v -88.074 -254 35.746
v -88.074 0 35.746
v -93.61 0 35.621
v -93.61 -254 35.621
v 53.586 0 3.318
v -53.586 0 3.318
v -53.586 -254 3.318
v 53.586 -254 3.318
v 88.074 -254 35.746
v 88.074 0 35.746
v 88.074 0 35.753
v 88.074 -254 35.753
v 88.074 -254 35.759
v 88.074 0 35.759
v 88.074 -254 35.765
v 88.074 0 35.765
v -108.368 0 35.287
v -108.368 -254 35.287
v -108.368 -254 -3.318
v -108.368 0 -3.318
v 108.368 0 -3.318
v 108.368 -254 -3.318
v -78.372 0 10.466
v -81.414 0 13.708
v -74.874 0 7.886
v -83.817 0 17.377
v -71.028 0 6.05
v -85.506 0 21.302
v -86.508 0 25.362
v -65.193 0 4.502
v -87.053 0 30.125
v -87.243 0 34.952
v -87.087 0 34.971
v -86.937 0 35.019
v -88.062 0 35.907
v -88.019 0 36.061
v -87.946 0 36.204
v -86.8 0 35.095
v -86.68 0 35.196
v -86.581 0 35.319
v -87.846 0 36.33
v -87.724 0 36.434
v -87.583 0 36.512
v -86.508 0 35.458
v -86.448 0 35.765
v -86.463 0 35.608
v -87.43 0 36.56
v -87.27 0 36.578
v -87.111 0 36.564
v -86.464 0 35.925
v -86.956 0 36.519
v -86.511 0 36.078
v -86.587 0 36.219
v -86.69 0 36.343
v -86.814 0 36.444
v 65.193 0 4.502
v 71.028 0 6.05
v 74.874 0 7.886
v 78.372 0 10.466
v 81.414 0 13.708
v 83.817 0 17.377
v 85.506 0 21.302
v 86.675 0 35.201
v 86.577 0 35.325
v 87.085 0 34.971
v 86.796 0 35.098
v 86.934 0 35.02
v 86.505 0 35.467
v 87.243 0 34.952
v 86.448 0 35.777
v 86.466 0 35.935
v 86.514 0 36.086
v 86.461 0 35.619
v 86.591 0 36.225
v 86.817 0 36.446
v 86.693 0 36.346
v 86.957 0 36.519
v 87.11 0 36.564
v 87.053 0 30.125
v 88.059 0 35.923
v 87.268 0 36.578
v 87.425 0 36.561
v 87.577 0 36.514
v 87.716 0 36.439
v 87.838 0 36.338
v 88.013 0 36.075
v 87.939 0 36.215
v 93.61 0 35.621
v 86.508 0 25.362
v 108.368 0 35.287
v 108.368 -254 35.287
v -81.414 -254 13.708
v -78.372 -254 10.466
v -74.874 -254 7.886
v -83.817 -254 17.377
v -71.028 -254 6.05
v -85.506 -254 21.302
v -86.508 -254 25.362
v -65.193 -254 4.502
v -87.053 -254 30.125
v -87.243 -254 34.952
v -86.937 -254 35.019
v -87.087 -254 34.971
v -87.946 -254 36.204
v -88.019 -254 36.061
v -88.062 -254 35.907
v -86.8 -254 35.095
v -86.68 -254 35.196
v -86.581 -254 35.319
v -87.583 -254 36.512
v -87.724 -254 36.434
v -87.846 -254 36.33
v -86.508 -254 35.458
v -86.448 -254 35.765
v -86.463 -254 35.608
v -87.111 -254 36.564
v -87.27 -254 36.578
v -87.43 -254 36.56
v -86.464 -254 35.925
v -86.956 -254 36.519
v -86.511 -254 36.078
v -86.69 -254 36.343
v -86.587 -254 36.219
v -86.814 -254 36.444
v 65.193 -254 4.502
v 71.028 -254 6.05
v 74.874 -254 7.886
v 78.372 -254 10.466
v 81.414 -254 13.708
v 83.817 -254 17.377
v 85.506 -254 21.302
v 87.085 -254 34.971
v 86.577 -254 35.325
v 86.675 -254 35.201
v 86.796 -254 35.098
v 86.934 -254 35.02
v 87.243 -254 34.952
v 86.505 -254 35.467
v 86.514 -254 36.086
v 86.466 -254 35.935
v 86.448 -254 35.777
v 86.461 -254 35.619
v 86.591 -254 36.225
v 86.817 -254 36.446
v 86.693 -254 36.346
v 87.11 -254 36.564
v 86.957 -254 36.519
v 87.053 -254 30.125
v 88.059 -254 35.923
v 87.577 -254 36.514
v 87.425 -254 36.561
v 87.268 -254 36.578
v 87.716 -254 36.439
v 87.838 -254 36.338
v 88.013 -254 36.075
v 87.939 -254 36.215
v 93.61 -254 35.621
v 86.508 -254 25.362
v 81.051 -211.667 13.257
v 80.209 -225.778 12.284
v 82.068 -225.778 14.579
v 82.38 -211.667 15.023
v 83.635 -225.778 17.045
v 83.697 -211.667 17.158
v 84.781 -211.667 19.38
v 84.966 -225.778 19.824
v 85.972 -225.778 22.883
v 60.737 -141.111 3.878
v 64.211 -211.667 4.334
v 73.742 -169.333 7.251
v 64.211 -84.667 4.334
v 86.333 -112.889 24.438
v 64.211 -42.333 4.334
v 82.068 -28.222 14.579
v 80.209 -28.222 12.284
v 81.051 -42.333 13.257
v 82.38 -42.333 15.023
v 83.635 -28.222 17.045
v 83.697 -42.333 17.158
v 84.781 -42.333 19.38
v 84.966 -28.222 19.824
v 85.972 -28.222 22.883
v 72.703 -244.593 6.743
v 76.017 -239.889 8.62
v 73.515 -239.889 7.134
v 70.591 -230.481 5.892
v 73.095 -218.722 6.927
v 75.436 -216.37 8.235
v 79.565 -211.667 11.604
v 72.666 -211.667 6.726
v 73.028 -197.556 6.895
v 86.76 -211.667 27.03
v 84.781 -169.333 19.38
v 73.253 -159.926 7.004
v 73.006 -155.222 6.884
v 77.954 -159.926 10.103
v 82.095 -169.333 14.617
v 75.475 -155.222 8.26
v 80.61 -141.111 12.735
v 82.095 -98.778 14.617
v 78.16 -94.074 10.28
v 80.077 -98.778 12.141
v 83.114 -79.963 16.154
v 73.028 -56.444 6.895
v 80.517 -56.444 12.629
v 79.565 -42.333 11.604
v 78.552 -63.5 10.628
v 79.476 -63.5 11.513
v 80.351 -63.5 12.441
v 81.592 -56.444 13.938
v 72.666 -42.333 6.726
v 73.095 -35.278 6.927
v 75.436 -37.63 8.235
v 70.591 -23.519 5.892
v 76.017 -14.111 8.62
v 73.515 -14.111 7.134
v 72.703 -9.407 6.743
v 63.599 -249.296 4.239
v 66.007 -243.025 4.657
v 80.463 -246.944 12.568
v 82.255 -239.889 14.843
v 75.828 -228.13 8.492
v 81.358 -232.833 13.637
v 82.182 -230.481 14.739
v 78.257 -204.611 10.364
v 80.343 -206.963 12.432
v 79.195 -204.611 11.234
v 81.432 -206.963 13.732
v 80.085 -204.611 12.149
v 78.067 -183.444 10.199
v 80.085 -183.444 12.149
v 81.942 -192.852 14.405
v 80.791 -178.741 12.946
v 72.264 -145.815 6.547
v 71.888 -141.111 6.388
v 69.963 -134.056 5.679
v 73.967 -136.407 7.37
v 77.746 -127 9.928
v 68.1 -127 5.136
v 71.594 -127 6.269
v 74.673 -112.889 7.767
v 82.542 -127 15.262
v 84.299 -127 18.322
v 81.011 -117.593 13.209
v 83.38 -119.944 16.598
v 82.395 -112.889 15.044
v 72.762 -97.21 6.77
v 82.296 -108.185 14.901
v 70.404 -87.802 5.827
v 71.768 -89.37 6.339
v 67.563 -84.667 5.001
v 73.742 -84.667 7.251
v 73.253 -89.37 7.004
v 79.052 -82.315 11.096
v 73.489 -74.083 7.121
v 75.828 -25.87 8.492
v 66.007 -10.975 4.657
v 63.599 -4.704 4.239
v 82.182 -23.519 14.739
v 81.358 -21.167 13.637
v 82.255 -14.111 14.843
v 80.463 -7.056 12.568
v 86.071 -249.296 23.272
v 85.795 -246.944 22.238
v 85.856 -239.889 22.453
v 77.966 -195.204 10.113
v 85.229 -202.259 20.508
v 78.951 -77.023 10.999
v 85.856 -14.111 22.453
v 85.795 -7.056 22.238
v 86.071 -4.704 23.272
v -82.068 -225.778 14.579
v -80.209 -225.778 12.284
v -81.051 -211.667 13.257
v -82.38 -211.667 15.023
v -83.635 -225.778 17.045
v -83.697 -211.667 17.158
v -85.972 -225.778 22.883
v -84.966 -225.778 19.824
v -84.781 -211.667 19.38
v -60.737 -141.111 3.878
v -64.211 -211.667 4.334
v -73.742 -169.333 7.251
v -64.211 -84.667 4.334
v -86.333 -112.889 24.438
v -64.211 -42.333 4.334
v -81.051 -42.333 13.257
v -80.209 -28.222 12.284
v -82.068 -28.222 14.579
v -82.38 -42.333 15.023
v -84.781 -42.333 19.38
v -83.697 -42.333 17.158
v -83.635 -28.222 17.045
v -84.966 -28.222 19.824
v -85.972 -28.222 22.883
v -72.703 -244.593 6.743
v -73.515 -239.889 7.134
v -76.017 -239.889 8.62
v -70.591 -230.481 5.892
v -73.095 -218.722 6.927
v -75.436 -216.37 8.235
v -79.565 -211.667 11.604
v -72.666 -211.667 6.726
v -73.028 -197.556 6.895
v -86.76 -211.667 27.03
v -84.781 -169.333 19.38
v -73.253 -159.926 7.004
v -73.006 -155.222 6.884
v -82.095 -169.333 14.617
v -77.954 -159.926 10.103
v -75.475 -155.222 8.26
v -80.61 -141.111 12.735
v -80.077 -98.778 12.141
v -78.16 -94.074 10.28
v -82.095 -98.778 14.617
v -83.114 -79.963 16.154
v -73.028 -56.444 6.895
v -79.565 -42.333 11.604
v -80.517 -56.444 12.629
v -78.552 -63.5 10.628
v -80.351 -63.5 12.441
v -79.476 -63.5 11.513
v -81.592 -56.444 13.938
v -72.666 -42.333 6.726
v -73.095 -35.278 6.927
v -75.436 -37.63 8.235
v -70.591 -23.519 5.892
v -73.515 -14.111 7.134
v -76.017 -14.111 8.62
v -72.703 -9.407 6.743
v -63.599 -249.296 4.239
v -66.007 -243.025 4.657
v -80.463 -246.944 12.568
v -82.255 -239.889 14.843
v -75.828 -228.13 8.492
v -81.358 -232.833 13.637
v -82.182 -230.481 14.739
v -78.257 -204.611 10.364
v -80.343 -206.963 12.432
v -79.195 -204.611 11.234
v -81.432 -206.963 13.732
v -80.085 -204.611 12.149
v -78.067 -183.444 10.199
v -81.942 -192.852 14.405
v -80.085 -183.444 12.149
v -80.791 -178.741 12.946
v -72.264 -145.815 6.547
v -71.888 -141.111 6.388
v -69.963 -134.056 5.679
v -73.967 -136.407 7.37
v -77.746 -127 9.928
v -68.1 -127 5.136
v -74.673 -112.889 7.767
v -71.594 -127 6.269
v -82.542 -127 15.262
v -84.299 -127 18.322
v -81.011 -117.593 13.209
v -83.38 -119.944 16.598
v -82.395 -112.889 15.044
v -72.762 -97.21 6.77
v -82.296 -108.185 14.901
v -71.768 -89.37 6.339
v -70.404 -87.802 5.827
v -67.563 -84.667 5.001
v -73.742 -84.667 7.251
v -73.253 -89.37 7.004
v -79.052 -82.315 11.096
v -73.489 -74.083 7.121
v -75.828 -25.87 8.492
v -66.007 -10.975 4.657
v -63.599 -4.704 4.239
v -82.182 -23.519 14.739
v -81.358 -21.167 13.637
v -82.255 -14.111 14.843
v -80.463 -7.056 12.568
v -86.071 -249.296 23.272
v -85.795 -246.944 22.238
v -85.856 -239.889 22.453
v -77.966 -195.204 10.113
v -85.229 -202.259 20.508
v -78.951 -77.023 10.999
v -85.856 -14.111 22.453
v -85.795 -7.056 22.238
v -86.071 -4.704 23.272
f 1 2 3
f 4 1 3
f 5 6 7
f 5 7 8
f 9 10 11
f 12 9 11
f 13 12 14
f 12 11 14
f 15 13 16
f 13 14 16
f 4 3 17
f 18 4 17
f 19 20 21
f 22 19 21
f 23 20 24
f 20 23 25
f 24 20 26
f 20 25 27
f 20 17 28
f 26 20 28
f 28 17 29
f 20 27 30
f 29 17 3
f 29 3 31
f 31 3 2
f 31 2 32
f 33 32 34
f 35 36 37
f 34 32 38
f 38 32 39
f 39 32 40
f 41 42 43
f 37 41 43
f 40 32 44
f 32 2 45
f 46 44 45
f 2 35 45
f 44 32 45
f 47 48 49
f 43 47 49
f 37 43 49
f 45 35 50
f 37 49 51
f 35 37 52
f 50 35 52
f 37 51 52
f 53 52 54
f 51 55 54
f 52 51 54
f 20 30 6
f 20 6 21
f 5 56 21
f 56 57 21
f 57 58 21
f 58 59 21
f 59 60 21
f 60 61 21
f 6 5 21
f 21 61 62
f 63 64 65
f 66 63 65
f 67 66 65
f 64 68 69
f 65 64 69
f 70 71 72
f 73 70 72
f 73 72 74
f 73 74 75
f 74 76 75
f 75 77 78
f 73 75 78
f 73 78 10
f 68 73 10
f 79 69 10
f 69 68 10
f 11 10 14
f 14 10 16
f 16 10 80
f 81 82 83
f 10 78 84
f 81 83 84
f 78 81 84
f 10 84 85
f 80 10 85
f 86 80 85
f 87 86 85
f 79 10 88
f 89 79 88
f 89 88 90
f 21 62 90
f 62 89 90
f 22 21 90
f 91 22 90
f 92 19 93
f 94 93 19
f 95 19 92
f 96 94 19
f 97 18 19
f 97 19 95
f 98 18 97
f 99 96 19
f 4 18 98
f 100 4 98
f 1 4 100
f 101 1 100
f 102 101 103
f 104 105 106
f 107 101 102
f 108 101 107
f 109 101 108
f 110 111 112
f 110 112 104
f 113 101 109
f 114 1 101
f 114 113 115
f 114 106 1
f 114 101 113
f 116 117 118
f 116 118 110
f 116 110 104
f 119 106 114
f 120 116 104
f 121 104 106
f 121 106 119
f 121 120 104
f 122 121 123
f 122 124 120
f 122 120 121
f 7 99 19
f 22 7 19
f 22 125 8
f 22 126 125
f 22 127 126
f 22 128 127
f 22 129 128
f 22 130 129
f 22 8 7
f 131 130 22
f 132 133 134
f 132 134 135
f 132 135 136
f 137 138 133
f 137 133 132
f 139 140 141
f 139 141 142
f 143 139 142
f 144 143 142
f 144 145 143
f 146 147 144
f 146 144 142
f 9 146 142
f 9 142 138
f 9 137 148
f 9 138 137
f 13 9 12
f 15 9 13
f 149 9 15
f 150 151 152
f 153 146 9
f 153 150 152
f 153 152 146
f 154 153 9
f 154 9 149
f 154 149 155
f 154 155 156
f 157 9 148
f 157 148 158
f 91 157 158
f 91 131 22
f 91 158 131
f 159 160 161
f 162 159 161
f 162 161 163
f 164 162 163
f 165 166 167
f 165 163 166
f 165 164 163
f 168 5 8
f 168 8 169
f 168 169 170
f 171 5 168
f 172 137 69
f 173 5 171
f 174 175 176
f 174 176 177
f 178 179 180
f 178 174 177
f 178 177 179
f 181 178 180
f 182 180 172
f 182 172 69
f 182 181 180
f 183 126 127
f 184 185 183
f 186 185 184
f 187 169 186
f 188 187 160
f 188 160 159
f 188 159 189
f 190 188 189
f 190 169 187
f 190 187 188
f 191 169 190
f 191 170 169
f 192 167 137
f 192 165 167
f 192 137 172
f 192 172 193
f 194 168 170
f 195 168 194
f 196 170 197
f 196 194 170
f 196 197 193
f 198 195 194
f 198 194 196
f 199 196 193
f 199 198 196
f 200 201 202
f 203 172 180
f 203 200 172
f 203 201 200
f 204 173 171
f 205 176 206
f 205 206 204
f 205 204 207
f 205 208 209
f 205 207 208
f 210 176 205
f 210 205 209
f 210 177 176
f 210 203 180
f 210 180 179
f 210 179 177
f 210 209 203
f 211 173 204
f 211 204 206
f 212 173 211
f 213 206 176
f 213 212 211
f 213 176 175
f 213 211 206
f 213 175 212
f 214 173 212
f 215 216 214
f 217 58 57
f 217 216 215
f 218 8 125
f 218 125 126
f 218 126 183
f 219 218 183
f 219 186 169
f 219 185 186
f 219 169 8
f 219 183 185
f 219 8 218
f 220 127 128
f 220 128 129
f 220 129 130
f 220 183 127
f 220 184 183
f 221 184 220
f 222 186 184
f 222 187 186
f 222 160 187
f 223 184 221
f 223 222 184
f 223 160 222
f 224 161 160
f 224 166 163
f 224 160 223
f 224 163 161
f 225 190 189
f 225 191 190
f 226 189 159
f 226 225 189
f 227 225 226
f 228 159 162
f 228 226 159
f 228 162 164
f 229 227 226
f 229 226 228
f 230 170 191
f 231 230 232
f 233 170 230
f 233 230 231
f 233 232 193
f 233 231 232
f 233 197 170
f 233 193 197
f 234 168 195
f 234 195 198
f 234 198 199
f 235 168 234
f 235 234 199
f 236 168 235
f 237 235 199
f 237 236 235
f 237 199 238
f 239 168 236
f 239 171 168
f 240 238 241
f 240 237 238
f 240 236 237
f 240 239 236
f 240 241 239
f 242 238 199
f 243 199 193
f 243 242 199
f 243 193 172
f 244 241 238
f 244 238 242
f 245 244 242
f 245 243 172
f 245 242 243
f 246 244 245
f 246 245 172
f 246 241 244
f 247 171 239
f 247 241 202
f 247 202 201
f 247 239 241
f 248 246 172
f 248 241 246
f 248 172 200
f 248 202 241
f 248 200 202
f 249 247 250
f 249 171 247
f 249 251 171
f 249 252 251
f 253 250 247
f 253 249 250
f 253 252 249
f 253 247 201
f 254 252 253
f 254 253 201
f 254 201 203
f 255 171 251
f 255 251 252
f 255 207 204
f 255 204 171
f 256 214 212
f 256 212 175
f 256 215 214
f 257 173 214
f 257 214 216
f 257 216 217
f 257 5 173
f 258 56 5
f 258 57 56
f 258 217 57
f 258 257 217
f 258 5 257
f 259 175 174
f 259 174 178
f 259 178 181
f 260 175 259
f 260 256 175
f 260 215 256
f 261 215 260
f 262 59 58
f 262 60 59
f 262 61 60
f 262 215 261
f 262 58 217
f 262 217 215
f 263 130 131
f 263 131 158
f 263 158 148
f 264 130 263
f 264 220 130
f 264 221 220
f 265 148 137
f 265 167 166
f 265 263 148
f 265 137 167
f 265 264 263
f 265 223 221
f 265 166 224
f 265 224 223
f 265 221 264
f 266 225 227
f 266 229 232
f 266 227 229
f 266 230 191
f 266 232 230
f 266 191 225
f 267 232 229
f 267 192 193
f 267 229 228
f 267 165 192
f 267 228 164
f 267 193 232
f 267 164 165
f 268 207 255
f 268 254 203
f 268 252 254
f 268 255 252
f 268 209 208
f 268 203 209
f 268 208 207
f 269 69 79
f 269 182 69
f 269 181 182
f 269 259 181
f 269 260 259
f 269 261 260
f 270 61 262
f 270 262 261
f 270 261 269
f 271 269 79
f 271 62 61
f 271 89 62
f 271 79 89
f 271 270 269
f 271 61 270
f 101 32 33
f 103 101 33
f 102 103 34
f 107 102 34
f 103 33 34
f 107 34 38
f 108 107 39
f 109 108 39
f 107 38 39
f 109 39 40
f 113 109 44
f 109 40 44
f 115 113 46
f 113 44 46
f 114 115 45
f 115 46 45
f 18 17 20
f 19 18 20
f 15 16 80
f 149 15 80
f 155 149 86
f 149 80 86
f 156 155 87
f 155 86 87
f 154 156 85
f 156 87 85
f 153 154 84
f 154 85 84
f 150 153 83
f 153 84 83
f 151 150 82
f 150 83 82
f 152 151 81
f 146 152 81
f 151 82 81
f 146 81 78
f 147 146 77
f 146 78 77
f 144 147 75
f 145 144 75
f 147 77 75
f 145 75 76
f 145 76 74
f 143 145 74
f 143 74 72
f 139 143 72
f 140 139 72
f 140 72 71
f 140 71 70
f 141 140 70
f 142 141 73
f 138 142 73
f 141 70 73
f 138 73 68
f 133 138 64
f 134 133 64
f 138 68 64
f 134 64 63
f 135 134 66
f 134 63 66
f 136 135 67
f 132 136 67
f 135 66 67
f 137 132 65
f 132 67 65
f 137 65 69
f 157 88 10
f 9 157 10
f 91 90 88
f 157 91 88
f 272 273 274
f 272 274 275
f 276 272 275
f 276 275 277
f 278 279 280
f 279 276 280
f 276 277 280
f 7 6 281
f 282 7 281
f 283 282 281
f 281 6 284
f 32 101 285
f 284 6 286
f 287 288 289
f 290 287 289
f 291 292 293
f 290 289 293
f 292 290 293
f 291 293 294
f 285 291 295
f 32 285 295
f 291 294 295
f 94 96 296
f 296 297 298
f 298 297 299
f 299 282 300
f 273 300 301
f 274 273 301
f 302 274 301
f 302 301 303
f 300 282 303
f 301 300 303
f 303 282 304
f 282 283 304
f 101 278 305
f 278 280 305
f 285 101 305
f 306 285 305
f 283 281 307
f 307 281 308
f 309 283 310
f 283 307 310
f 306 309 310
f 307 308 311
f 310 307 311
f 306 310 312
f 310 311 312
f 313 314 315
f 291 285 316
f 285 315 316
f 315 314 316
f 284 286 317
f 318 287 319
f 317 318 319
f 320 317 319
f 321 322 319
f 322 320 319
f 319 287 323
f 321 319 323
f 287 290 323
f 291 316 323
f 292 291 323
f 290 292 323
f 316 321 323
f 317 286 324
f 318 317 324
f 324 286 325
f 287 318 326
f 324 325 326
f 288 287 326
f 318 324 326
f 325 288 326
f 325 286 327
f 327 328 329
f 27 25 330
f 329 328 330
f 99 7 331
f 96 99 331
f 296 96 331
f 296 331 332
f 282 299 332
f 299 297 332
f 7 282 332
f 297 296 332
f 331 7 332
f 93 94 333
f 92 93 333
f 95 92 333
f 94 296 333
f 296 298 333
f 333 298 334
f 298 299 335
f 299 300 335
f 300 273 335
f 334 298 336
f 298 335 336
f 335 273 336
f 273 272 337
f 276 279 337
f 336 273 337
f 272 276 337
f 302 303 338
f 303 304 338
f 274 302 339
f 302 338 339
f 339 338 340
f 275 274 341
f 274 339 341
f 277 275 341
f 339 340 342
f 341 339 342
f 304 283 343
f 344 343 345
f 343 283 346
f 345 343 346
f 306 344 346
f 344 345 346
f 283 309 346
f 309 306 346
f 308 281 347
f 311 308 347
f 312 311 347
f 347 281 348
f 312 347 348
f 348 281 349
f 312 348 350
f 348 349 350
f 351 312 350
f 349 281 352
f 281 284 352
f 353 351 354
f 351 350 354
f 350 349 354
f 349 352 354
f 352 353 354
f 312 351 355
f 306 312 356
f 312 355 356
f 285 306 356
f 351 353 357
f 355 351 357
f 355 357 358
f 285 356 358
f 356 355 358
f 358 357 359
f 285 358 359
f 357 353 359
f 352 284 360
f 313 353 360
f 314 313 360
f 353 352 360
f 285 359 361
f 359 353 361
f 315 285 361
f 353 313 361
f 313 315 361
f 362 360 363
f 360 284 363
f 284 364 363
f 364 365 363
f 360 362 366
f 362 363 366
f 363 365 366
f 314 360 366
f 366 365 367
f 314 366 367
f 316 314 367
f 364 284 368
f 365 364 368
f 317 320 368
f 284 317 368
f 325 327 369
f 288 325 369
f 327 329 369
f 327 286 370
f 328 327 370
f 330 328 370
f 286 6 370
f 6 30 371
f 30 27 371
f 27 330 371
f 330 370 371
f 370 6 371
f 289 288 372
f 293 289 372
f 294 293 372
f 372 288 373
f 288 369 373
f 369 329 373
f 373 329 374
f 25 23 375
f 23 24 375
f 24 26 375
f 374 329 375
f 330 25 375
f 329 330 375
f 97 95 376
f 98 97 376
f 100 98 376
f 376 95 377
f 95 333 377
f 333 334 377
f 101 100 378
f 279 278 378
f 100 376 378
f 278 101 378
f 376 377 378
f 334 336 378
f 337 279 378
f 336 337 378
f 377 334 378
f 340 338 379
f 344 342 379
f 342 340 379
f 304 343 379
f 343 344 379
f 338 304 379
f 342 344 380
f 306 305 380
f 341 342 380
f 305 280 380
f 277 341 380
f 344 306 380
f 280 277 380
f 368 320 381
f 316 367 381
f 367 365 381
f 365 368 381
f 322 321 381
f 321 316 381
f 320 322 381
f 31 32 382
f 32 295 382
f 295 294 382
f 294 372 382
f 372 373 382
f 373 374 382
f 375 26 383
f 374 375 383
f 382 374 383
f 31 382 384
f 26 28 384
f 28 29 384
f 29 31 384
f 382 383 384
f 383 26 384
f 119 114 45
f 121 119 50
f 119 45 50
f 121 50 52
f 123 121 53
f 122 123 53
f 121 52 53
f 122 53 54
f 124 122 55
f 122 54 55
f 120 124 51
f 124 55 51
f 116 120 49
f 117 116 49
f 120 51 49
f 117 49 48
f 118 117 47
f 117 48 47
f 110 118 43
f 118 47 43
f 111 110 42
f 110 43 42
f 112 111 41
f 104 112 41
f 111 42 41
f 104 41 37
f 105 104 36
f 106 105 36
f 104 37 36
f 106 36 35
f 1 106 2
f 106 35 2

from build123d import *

# Parameters (mm, degrees)
F0_W     = 107.1716099977
F0_H     = 6.6367755644
F1_DEPTH = 254


# Not quite as in the source:
# - ends of sketch curves that miss each other by under 0.0002 mm in the source are joined


with BuildPart() as f1:
    # F0 (on Front) → F1 (new body)
    with BuildSketch(Plane.XZ):
        with BuildLine():
            Line((-53.5858049989, -3.3183877822), (-53.5858049989, 3.3183877822))
            add(Edge.make_bspline(
                [(-53.5858049989, 3.3183877822), (-60.7905189574, 3.7842082585), (-74.5629530695, 4.6746644037), (-86.6963968754, 19.2661575582), (-87.1229924092, 29.8680118762), (-87.2426380733, 34.9518884332)],
                knots=[0, 0, 0, 0, 0.3582791422, 0.6848815801, 0.984054993, 0.984054993, 0.984054993, 0.984054993], degree=3))
            ThreePointArc((-87.2426380733, 34.9518884332), (-87.8230310318, 35.1768908631), (-88.0742459033, 35.7464285425))
            Line((-88.0742459033, 35.7464285425), (-93.6096602081, 35.6210684855))
            Line((-93.6096602081, 35.6210684855), (-108.3679497242, 35.286838758))
            Line((-108.3679497242, 35.286838758), (-108.3679497242, -3.3183877822))
            Line((-108.3679497242, -3.3183877822), (-53.5858049989, -3.3183877822))
        make_face()
        with BuildLine():
            add(Edge.make_bspline(
                [(53.5858049989, 3.3183877822), (60.7905189574, 3.7842082585), (74.5629530695, 4.6746644037), (86.6963968754, 19.2661575582), (87.1229924092, 29.8680118762), (87.2426380733, 34.9518884332)],
                knots=[0, 0, 0, 0, 0.3582791422, 0.6848815801, 0.984054993, 0.984054993, 0.984054993, 0.984054993], degree=3))
            Line((53.5858049989, 3.3183877822), (53.5858049989, -3.3183877822))
            Line((53.5858049989, -3.3183877822), (108.3679497242, -3.3183877822))
            Line((108.3679497242, -3.3183877822), (108.3679497242, 35.286838758))
            Line((108.3679497242, 35.286838758), (93.6096602081, 35.6210684855))
            Line((93.6096602081, 35.6210684855), (88.0742459033, 35.7464285425))
            ThreePointArc((88.0742459033, 35.7464285425), (87.8230310318, 35.1768908631), (87.2426380733, 34.9518884332))
        make_face()
        Rectangle(F0_W, F0_H)
        with BuildLine():
            add(Edge.make_bspline(
                [(-87.2426380733, 34.9518884332), (-87.2490148129, 35.2228431489), (-87.2551520855, 35.4938413246), (-87.2612893581, 35.7648395002)],
                knots=[0.984054993, 0.984054993, 0.984054993, 0.984054993, 1, 1, 1, 1], degree=3))
            ThreePointArc((-87.2426380733, 34.9518884332), (-86.6797380364, 35.1964774959), (-86.448124364, 35.7648395002))
            ThreePointArc((-86.448124364, 35.7648395002), (-87.270495427, 36.5779523805), (-88.0742459033, 35.7464285425))
            Line((-88.0742459033, 35.7464285425), (-87.2612893581, 35.7648395002))
        make_face()
        with BuildLine():
            ThreePointArc((-88.0742459033, 35.7464285425), (-87.8230310318, 35.1768908631), (-87.2426380733, 34.9518884332))
            add(Edge.make_bspline(
                [(-87.2426380733, 34.9518884332), (-87.2490148129, 35.2228431489), (-87.2551520855, 35.4938413246), (-87.2612893581, 35.7648395002)],
                knots=[0.984054993, 0.984054993, 0.984054993, 0.984054993, 1, 1, 1, 1], degree=3))
            Line((-87.2612893581, 35.7648395002), (-88.0742459033, 35.7464285425))
        make_face()
        with BuildLine():
            add(Edge.make_bspline(
                [(87.2426380733, 34.9518884332), (87.2490148129, 35.2228431489), (87.2551520855, 35.4938413246), (87.2612893581, 35.7648395002)],
                knots=[0.984054993, 0.984054993, 0.984054993, 0.984054993, 1, 1, 1, 1], degree=3))
            ThreePointArc((87.2426380733, 34.9518884332), (87.8230310318, 35.1768908631), (88.0742459033, 35.7464285425))
            Line((88.0742459033, 35.7464285425), (87.2612893581, 35.7648395002))
        make_face()
        with BuildLine():
            ThreePointArc((88.0744543523, 35.7648395002), (86.6929273539, 36.346390822), (87.2426380733, 34.9518884332))
            add(Edge.make_bspline(
                [(87.2426380733, 34.9518884332), (87.2490148129, 35.2228431489), (87.2551520855, 35.4938413246), (87.2612893581, 35.7648395002)],
                knots=[0.984054993, 0.984054993, 0.984054993, 0.984054993, 1, 1, 1, 1], degree=3))
            Line((87.2612893581, 35.7648395002), (88.0742459033, 35.7464285425))
            ThreePointArc((88.0742459033, 35.7464285425), (88.0744022384, 35.7556334313), (88.0744543523, 35.7648395002))
        make_face()
    extrude(amount=F1_DEPTH)


solid = f1.part
